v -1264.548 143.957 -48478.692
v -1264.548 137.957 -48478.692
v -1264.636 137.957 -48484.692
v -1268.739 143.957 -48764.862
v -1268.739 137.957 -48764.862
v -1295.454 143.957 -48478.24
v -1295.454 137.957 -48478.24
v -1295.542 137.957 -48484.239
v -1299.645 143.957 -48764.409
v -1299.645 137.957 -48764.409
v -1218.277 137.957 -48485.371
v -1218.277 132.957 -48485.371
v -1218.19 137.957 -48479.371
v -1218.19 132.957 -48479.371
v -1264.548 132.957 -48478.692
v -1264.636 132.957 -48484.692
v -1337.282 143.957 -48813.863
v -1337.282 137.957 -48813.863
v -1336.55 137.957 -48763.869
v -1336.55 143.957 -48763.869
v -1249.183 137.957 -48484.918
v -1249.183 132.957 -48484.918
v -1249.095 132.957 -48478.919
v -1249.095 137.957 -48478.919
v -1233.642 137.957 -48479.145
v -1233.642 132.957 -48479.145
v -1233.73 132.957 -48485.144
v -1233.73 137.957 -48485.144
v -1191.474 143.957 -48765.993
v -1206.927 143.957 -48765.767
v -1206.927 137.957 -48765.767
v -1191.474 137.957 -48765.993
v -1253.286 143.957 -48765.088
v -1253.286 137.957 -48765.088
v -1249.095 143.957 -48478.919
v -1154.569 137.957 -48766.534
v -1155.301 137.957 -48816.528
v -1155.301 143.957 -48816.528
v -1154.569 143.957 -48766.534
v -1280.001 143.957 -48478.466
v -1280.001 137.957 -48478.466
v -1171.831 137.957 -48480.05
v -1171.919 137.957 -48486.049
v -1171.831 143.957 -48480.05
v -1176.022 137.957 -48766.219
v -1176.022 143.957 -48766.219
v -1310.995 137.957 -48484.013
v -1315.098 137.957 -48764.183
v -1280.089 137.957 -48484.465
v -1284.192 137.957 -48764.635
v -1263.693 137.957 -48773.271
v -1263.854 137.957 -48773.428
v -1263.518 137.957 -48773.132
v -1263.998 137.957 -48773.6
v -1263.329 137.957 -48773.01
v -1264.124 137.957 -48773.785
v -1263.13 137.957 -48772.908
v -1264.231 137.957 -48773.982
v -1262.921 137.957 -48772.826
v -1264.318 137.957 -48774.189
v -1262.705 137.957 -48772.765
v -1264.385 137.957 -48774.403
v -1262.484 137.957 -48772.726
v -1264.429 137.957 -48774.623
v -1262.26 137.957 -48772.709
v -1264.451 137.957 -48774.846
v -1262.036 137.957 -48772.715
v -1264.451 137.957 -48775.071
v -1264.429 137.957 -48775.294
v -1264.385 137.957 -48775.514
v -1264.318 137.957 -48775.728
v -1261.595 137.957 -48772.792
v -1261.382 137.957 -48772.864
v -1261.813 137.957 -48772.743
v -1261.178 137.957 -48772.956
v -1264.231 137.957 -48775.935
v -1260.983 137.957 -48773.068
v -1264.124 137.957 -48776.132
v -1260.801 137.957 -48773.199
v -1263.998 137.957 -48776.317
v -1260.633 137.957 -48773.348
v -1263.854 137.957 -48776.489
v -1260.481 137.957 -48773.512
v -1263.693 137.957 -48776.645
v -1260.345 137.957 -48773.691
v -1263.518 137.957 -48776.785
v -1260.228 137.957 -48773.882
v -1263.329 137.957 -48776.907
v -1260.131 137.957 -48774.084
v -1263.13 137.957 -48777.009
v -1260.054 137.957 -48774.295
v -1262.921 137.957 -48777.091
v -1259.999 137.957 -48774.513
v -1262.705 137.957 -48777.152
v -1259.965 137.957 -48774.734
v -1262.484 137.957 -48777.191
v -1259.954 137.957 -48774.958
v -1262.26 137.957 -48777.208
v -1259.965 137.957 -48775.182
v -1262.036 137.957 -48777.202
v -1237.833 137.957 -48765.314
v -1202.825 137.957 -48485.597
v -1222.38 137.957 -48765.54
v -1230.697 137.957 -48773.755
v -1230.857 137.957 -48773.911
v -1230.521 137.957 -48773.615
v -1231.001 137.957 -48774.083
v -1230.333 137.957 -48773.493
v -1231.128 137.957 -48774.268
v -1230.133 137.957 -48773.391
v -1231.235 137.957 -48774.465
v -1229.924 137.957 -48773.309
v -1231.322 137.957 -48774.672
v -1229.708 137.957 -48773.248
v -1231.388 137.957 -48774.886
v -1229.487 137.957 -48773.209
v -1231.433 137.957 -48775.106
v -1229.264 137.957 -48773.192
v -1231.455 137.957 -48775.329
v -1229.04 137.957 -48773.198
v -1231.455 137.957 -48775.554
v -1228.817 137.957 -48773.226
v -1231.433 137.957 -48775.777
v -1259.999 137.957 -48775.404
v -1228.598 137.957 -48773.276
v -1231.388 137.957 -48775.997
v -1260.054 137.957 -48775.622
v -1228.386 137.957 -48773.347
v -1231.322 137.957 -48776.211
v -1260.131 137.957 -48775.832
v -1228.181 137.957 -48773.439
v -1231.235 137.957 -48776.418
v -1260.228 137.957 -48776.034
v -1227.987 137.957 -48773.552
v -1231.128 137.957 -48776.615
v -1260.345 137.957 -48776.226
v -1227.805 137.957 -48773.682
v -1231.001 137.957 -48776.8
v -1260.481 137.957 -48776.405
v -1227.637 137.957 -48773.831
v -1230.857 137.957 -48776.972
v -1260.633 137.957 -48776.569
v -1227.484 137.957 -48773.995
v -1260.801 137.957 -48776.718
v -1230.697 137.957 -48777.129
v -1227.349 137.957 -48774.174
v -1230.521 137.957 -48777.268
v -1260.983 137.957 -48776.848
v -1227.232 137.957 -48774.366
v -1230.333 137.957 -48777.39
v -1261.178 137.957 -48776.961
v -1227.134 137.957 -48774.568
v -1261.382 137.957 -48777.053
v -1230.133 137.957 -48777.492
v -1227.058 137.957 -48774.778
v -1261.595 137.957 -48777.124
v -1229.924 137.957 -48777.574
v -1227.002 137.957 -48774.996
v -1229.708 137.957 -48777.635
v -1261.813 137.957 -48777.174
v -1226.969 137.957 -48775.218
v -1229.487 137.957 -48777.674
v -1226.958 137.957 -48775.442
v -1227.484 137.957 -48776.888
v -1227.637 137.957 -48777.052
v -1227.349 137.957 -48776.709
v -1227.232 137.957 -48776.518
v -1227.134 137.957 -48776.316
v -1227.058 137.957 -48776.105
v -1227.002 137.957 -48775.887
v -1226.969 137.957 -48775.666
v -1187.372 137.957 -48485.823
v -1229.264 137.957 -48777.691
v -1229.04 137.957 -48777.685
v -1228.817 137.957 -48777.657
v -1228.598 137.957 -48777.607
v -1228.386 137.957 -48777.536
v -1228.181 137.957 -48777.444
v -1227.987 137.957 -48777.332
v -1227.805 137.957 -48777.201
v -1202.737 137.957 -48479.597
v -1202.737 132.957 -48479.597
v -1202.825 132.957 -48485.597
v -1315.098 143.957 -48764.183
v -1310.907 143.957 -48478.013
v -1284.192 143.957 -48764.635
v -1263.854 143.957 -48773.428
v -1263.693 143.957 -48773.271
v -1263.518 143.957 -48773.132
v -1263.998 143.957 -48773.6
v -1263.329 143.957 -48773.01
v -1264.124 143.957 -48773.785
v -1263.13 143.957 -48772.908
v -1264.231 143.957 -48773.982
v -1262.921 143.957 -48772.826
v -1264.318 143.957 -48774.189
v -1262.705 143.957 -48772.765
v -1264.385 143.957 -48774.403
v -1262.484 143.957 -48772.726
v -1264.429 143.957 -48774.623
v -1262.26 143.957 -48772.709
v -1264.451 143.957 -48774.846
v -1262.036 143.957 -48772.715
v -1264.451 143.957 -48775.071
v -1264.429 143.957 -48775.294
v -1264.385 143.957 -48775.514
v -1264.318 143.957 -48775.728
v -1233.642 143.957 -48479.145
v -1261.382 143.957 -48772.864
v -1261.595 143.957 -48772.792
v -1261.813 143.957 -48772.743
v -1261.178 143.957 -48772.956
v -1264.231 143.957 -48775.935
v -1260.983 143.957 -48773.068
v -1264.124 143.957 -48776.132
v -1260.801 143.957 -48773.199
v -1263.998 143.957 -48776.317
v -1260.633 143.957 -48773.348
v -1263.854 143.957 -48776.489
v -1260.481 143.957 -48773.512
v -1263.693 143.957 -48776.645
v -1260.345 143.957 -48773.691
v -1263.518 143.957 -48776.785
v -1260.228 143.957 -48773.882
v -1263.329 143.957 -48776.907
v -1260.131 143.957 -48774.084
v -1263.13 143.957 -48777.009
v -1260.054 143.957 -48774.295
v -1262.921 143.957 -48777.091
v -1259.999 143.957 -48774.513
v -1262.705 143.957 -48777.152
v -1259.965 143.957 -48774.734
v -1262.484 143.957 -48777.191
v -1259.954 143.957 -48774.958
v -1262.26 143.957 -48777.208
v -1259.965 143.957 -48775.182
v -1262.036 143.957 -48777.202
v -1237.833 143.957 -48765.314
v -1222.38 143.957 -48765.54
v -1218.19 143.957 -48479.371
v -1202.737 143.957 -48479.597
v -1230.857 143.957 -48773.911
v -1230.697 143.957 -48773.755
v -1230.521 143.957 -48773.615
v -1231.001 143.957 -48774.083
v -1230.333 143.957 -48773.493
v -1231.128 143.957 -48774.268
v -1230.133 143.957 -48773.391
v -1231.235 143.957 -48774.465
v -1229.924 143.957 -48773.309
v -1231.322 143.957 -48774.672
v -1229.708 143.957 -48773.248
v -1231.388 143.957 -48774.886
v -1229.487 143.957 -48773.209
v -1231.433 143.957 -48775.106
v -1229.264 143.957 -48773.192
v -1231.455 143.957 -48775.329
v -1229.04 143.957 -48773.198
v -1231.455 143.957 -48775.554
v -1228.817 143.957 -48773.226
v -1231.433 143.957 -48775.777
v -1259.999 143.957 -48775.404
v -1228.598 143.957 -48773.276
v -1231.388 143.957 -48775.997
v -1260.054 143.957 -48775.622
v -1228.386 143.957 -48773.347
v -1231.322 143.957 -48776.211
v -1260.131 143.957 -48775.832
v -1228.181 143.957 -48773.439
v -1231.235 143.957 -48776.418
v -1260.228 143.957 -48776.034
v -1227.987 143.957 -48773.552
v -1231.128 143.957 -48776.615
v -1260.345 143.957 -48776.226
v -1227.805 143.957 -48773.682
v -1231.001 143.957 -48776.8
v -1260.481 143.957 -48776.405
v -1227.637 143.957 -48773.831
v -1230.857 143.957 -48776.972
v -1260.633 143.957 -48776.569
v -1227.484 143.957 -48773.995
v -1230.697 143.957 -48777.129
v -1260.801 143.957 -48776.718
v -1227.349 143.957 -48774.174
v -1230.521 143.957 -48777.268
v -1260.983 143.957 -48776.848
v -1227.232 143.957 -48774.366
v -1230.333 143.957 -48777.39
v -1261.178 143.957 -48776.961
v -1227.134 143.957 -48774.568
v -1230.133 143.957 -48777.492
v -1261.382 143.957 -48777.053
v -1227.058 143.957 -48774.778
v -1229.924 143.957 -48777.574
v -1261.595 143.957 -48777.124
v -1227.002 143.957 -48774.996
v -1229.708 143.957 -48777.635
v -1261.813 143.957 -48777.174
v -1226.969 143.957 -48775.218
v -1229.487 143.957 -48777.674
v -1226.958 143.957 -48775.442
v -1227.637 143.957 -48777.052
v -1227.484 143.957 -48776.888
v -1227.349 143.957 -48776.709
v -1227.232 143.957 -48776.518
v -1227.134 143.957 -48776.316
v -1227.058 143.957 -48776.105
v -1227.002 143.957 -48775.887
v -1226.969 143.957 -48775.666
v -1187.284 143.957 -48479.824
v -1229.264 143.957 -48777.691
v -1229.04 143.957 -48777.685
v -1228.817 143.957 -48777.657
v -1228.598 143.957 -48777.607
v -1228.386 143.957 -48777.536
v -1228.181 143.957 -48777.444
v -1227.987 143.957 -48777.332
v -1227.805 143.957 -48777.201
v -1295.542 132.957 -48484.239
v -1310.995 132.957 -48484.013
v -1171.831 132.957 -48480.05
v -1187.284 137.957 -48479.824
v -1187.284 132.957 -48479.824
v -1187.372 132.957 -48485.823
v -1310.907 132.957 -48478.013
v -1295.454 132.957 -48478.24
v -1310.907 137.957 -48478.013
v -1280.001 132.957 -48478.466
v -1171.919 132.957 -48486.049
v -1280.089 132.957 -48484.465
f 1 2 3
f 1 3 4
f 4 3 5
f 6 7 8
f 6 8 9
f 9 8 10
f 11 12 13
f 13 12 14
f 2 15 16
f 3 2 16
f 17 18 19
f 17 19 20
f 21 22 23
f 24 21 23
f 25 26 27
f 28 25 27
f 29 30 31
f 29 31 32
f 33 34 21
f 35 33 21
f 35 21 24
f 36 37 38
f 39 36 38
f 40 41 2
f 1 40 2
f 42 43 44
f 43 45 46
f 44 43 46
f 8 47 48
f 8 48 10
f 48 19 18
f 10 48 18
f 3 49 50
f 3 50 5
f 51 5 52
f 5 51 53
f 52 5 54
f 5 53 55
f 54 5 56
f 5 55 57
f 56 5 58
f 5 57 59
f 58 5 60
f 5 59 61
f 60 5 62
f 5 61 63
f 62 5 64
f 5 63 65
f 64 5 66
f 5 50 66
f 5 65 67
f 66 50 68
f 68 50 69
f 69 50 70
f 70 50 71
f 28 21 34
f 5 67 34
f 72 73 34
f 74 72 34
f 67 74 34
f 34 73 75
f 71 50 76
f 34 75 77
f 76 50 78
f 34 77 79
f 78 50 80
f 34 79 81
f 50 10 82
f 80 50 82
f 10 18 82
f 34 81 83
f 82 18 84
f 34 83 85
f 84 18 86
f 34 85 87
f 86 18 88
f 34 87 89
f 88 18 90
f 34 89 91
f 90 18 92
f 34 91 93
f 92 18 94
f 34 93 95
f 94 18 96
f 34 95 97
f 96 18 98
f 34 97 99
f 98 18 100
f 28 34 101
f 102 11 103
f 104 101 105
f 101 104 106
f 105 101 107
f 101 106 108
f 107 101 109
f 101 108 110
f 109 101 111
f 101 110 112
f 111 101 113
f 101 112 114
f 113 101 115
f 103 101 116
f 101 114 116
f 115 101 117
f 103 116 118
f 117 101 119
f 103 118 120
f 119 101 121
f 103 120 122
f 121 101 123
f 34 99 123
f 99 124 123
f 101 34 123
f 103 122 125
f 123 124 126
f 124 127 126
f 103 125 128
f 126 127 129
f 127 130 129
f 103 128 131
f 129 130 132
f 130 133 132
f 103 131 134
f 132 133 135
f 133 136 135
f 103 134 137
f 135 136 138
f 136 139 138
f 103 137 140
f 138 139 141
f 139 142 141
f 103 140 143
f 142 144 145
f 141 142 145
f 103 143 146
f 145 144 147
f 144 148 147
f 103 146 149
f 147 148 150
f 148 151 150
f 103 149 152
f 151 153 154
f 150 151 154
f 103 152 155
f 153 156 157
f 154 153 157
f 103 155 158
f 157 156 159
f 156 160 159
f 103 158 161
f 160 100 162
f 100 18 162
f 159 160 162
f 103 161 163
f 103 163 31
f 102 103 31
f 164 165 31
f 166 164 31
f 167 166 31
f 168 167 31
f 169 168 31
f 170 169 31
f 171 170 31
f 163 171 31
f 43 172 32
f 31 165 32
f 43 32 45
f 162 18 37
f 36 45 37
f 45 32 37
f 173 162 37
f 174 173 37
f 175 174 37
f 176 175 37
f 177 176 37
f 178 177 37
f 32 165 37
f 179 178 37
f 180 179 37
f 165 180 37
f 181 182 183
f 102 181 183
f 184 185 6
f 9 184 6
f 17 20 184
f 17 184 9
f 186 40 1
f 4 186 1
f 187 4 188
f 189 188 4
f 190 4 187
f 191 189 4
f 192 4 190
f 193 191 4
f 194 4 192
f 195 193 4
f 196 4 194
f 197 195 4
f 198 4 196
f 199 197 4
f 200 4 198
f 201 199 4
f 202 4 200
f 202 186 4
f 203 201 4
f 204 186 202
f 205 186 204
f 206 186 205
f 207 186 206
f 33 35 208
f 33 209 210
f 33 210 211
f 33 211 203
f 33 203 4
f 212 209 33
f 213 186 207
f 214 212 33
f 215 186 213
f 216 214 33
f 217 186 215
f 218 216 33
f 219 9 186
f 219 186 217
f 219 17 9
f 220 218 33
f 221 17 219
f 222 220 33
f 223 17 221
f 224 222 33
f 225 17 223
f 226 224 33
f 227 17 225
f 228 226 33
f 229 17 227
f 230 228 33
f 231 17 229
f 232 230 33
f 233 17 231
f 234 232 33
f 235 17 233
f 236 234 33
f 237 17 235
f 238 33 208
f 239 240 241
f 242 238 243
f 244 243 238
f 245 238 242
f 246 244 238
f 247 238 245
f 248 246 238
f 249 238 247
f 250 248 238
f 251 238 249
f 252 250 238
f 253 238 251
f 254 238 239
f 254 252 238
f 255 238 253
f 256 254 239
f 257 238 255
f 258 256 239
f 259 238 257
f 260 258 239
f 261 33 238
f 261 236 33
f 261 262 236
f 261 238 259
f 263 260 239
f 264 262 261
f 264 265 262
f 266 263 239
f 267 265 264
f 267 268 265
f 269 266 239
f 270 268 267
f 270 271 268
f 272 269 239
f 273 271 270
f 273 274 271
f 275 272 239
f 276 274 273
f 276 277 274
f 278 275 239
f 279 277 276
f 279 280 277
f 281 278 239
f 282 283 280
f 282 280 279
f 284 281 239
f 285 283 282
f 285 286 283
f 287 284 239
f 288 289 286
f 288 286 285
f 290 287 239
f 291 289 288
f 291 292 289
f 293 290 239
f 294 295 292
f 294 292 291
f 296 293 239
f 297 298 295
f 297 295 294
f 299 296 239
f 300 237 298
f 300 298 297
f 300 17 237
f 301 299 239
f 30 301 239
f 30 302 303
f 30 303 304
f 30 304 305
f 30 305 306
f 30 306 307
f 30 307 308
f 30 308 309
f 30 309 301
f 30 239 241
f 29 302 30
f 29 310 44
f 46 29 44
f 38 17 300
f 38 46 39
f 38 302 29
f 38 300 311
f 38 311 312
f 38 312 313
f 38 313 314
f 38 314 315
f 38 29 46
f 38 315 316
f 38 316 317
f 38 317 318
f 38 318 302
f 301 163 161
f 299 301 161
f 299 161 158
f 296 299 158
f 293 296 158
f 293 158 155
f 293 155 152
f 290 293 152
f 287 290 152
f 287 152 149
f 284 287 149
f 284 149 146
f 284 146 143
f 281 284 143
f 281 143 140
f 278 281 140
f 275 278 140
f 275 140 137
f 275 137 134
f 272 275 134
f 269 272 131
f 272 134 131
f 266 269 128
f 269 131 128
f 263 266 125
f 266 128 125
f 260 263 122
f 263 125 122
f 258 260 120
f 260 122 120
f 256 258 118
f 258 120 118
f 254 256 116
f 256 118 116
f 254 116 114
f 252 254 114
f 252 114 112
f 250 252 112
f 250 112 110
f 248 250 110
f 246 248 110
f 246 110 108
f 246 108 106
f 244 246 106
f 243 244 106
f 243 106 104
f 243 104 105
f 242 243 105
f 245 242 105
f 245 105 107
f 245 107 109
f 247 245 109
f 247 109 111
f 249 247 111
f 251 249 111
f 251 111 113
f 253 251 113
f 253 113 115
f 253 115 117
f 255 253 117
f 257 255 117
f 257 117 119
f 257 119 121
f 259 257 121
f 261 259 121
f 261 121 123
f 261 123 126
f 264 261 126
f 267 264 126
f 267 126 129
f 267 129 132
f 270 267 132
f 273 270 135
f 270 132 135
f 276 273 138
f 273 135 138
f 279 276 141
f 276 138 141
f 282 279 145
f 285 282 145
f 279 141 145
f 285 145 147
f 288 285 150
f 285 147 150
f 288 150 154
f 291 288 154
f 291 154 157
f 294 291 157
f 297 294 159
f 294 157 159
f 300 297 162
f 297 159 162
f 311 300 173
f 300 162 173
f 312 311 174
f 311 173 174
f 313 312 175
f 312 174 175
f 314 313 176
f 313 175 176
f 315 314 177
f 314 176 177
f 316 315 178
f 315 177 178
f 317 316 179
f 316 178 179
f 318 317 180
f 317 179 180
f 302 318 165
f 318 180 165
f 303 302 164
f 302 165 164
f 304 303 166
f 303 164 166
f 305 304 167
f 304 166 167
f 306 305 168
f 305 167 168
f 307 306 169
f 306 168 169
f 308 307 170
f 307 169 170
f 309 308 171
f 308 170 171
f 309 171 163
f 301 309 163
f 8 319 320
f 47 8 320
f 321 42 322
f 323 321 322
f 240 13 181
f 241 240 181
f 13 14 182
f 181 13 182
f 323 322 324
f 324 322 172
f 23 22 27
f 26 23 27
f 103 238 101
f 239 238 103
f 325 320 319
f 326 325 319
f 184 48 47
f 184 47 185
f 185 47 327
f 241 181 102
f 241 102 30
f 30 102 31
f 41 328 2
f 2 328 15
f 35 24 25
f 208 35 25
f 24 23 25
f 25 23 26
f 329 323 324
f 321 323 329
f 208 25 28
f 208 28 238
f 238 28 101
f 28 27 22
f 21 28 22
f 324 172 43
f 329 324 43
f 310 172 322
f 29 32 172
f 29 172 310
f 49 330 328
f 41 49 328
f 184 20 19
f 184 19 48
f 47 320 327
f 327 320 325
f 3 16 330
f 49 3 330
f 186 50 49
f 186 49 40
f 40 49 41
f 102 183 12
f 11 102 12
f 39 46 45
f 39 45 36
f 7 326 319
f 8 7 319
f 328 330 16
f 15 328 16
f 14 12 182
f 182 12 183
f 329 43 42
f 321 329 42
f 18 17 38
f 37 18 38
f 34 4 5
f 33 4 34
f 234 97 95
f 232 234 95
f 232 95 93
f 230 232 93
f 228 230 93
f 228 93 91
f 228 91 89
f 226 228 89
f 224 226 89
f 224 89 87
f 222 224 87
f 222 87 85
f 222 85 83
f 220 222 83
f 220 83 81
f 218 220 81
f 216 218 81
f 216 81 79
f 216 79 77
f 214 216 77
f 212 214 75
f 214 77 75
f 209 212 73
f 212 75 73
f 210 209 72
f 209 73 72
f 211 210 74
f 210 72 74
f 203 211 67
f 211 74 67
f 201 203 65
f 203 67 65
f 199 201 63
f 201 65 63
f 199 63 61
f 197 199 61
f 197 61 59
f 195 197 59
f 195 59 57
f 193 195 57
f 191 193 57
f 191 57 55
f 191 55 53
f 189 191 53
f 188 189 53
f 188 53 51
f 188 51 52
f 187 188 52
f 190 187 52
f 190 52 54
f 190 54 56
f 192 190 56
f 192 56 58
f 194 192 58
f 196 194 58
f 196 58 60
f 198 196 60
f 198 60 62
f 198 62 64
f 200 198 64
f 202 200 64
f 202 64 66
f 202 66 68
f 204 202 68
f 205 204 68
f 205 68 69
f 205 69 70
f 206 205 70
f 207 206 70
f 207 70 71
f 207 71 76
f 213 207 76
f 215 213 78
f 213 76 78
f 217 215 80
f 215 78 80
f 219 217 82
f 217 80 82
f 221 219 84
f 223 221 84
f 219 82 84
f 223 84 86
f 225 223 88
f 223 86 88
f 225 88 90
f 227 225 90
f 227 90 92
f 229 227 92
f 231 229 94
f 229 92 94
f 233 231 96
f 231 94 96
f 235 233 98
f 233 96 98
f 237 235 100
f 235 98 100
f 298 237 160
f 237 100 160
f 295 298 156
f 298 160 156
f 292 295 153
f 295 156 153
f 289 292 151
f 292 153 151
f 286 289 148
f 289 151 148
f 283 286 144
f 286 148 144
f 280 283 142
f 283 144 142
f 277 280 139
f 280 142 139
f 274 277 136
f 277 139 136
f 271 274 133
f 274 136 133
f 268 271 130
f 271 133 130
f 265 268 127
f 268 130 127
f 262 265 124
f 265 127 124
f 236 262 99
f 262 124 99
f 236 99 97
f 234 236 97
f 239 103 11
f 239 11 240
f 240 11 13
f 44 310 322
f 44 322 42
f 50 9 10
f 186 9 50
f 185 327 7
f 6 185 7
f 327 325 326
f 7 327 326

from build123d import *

# Parameters (mm, degrees)
EXTRUDE_1_DEPTH          = 30
EXTRUDE_1_DEPTH_BACK     = 20
SKETCH_1_W               = 182
SKETCH_1_H               = 6
SKETCH_2_W               = 15.454545454
SKETCH_2_H               = 6
EXTRUDE_2_DEPTH          = 286.2
EXTRUDE_3_DEPTH          = 5
PATTERN_START            = 137.957019682
PATTERN_LINEAR_1_DEPTH   = 6
PATTERN_START_2          = 132.957019682
PATTERN_LINEAR_1_2_DEPTH = 5
SKETCH_6_R               = 2.25
CUT_EXTRUDE_1_DEPTH      = 48835.841869249


# Read off the part's stored shape, not the designer's step: Линейный массив1
with BuildPart() as part:
    # Эскиз1 → Бобышка-Вытянуть1 (new, two sides: drawn at the far end of the back side and taken through both)
    with BuildSketch(Plane(origin=(-714.669316418, 0, -48802.97861783), x_dir=(0.9998927943248835, 0, -0.01464239929711995), z_dir=(0.01464239929711995, 0, 0.9998927943248835)).offset(-EXTRUDE_1_DEPTH_BACK)):
        with Locations((-531.386445276, 140.957019682)):
            Rectangle(SKETCH_1_W, SKETCH_1_H)
    extrude(amount=EXTRUDE_1_DEPTH + EXTRUDE_1_DEPTH_BACK)

    # Эскиз2 → Бобышка-Вытянуть2 (add)
    with BuildSketch(Plane(origin=(-714.23004444, 0, -48772.981834), x_dir=(0.9998927943248835, 0, -0.01464239929711995), z_dir=(0.01464239929711995, 0, 0.9998927943248835))):
        with Locations((-469.568263457, 140.957019682)):
            Rectangle(SKETCH_2_W, SKETCH_2_H)
    extrude(amount=EXTRUDE_2_DEPTH)

    # Эскиз5 → Бобышка-Вытянуть3 (add)
    with BuildSketch(Plane.XZ.offset(-137.957019682)):
        Polygon((-1187.283757155, -48479.82376444), (-1187.371611551, -48485.823121206), (-1171.918722912, -48486.049412832), (-1171.830868516, -48480.050056066), align=None)
    extrude(amount=EXTRUDE_3_DEPTH)

    # Линейный массив1 outline → Линейный массив1 (add)
    with BuildSketch(Plane(origin=(0, 0, 0), x_dir=(1, 0, 0), z_dir=(0, 1, 0)).offset(PATTERN_START)):
        Polygon((-1310.906866272, 48478.013431436), (-1295.453977632, 48478.239723062), (-1299.644632311, 48764.409040798), (-1315.097520951, 48764.182749172), align=None)
        Polygon((-1206.927300474, 48765.766790551), (-1222.380189113, 48765.540498925), (-1218.189534435, 48479.371181189), (-1202.736645795, 48479.597472815), align=None)
        Polygon((-1237.833077753, 48765.3142073), (-1253.285966393, 48765.087915674), (-1249.095311714, 48478.918597939), (-1233.642423074, 48479.144889564), align=None)
        Polygon((-1268.738855032, 48764.861624049), (-1284.191743672, 48764.635332423), (-1280.001088993, 48478.466014687), (-1264.548200353, 48478.692306313), align=None)
    extrude(amount=PATTERN_LINEAR_1_DEPTH)

    # Pattern Linear 1 2 outline → Pattern Linear 1 2 (add)
    with BuildSketch(Plane(origin=(0, 0, 0), x_dir=(1, 0, 0), z_dir=(0, 1, 0)).offset(PATTERN_START_2)):
        Polygon((-1310.994720668, 48484.012788202), (-1310.906866272, 48478.013431436), (-1295.453977632, 48478.239723062), (-1295.541832028, 48484.239079828), align=None)
        Polygon((-1264.636054749, 48484.691663079), (-1280.088943389, 48484.465371453), (-1280.001088993, 48478.466014688), (-1264.548200353, 48478.692306313), align=None)
        Polygon((-1233.73027747, 48485.14424633), (-1249.18316611, 48484.917954704), (-1249.095311714, 48478.918597939), (-1233.642423074, 48479.144889564), align=None)
        Polygon((-1202.824500191, 48485.596829581), (-1218.27738883, 48485.370537955), (-1218.189534435, 48479.371181189), (-1202.736645795, 48479.597472815), align=None)
    extrude(amount=PATTERN_LINEAR_1_2_DEPTH)

    # Эскиз6 → Вырез-Вытянуть1 (cut, through all)
    with BuildSketch(Plane.XZ.offset(-137.957019682)):
        with Locations((-1262.204177172, -48774.958389842)):
            Circle(SKETCH_6_R)
        with Locations((-1229.207714959, -48775.441589019)):
            Circle(SKETCH_6_R)
    extrude(amount=-CUT_EXTRUDE_1_DEPTH, mode=Mode.SUBTRACT)


solid = part.part
